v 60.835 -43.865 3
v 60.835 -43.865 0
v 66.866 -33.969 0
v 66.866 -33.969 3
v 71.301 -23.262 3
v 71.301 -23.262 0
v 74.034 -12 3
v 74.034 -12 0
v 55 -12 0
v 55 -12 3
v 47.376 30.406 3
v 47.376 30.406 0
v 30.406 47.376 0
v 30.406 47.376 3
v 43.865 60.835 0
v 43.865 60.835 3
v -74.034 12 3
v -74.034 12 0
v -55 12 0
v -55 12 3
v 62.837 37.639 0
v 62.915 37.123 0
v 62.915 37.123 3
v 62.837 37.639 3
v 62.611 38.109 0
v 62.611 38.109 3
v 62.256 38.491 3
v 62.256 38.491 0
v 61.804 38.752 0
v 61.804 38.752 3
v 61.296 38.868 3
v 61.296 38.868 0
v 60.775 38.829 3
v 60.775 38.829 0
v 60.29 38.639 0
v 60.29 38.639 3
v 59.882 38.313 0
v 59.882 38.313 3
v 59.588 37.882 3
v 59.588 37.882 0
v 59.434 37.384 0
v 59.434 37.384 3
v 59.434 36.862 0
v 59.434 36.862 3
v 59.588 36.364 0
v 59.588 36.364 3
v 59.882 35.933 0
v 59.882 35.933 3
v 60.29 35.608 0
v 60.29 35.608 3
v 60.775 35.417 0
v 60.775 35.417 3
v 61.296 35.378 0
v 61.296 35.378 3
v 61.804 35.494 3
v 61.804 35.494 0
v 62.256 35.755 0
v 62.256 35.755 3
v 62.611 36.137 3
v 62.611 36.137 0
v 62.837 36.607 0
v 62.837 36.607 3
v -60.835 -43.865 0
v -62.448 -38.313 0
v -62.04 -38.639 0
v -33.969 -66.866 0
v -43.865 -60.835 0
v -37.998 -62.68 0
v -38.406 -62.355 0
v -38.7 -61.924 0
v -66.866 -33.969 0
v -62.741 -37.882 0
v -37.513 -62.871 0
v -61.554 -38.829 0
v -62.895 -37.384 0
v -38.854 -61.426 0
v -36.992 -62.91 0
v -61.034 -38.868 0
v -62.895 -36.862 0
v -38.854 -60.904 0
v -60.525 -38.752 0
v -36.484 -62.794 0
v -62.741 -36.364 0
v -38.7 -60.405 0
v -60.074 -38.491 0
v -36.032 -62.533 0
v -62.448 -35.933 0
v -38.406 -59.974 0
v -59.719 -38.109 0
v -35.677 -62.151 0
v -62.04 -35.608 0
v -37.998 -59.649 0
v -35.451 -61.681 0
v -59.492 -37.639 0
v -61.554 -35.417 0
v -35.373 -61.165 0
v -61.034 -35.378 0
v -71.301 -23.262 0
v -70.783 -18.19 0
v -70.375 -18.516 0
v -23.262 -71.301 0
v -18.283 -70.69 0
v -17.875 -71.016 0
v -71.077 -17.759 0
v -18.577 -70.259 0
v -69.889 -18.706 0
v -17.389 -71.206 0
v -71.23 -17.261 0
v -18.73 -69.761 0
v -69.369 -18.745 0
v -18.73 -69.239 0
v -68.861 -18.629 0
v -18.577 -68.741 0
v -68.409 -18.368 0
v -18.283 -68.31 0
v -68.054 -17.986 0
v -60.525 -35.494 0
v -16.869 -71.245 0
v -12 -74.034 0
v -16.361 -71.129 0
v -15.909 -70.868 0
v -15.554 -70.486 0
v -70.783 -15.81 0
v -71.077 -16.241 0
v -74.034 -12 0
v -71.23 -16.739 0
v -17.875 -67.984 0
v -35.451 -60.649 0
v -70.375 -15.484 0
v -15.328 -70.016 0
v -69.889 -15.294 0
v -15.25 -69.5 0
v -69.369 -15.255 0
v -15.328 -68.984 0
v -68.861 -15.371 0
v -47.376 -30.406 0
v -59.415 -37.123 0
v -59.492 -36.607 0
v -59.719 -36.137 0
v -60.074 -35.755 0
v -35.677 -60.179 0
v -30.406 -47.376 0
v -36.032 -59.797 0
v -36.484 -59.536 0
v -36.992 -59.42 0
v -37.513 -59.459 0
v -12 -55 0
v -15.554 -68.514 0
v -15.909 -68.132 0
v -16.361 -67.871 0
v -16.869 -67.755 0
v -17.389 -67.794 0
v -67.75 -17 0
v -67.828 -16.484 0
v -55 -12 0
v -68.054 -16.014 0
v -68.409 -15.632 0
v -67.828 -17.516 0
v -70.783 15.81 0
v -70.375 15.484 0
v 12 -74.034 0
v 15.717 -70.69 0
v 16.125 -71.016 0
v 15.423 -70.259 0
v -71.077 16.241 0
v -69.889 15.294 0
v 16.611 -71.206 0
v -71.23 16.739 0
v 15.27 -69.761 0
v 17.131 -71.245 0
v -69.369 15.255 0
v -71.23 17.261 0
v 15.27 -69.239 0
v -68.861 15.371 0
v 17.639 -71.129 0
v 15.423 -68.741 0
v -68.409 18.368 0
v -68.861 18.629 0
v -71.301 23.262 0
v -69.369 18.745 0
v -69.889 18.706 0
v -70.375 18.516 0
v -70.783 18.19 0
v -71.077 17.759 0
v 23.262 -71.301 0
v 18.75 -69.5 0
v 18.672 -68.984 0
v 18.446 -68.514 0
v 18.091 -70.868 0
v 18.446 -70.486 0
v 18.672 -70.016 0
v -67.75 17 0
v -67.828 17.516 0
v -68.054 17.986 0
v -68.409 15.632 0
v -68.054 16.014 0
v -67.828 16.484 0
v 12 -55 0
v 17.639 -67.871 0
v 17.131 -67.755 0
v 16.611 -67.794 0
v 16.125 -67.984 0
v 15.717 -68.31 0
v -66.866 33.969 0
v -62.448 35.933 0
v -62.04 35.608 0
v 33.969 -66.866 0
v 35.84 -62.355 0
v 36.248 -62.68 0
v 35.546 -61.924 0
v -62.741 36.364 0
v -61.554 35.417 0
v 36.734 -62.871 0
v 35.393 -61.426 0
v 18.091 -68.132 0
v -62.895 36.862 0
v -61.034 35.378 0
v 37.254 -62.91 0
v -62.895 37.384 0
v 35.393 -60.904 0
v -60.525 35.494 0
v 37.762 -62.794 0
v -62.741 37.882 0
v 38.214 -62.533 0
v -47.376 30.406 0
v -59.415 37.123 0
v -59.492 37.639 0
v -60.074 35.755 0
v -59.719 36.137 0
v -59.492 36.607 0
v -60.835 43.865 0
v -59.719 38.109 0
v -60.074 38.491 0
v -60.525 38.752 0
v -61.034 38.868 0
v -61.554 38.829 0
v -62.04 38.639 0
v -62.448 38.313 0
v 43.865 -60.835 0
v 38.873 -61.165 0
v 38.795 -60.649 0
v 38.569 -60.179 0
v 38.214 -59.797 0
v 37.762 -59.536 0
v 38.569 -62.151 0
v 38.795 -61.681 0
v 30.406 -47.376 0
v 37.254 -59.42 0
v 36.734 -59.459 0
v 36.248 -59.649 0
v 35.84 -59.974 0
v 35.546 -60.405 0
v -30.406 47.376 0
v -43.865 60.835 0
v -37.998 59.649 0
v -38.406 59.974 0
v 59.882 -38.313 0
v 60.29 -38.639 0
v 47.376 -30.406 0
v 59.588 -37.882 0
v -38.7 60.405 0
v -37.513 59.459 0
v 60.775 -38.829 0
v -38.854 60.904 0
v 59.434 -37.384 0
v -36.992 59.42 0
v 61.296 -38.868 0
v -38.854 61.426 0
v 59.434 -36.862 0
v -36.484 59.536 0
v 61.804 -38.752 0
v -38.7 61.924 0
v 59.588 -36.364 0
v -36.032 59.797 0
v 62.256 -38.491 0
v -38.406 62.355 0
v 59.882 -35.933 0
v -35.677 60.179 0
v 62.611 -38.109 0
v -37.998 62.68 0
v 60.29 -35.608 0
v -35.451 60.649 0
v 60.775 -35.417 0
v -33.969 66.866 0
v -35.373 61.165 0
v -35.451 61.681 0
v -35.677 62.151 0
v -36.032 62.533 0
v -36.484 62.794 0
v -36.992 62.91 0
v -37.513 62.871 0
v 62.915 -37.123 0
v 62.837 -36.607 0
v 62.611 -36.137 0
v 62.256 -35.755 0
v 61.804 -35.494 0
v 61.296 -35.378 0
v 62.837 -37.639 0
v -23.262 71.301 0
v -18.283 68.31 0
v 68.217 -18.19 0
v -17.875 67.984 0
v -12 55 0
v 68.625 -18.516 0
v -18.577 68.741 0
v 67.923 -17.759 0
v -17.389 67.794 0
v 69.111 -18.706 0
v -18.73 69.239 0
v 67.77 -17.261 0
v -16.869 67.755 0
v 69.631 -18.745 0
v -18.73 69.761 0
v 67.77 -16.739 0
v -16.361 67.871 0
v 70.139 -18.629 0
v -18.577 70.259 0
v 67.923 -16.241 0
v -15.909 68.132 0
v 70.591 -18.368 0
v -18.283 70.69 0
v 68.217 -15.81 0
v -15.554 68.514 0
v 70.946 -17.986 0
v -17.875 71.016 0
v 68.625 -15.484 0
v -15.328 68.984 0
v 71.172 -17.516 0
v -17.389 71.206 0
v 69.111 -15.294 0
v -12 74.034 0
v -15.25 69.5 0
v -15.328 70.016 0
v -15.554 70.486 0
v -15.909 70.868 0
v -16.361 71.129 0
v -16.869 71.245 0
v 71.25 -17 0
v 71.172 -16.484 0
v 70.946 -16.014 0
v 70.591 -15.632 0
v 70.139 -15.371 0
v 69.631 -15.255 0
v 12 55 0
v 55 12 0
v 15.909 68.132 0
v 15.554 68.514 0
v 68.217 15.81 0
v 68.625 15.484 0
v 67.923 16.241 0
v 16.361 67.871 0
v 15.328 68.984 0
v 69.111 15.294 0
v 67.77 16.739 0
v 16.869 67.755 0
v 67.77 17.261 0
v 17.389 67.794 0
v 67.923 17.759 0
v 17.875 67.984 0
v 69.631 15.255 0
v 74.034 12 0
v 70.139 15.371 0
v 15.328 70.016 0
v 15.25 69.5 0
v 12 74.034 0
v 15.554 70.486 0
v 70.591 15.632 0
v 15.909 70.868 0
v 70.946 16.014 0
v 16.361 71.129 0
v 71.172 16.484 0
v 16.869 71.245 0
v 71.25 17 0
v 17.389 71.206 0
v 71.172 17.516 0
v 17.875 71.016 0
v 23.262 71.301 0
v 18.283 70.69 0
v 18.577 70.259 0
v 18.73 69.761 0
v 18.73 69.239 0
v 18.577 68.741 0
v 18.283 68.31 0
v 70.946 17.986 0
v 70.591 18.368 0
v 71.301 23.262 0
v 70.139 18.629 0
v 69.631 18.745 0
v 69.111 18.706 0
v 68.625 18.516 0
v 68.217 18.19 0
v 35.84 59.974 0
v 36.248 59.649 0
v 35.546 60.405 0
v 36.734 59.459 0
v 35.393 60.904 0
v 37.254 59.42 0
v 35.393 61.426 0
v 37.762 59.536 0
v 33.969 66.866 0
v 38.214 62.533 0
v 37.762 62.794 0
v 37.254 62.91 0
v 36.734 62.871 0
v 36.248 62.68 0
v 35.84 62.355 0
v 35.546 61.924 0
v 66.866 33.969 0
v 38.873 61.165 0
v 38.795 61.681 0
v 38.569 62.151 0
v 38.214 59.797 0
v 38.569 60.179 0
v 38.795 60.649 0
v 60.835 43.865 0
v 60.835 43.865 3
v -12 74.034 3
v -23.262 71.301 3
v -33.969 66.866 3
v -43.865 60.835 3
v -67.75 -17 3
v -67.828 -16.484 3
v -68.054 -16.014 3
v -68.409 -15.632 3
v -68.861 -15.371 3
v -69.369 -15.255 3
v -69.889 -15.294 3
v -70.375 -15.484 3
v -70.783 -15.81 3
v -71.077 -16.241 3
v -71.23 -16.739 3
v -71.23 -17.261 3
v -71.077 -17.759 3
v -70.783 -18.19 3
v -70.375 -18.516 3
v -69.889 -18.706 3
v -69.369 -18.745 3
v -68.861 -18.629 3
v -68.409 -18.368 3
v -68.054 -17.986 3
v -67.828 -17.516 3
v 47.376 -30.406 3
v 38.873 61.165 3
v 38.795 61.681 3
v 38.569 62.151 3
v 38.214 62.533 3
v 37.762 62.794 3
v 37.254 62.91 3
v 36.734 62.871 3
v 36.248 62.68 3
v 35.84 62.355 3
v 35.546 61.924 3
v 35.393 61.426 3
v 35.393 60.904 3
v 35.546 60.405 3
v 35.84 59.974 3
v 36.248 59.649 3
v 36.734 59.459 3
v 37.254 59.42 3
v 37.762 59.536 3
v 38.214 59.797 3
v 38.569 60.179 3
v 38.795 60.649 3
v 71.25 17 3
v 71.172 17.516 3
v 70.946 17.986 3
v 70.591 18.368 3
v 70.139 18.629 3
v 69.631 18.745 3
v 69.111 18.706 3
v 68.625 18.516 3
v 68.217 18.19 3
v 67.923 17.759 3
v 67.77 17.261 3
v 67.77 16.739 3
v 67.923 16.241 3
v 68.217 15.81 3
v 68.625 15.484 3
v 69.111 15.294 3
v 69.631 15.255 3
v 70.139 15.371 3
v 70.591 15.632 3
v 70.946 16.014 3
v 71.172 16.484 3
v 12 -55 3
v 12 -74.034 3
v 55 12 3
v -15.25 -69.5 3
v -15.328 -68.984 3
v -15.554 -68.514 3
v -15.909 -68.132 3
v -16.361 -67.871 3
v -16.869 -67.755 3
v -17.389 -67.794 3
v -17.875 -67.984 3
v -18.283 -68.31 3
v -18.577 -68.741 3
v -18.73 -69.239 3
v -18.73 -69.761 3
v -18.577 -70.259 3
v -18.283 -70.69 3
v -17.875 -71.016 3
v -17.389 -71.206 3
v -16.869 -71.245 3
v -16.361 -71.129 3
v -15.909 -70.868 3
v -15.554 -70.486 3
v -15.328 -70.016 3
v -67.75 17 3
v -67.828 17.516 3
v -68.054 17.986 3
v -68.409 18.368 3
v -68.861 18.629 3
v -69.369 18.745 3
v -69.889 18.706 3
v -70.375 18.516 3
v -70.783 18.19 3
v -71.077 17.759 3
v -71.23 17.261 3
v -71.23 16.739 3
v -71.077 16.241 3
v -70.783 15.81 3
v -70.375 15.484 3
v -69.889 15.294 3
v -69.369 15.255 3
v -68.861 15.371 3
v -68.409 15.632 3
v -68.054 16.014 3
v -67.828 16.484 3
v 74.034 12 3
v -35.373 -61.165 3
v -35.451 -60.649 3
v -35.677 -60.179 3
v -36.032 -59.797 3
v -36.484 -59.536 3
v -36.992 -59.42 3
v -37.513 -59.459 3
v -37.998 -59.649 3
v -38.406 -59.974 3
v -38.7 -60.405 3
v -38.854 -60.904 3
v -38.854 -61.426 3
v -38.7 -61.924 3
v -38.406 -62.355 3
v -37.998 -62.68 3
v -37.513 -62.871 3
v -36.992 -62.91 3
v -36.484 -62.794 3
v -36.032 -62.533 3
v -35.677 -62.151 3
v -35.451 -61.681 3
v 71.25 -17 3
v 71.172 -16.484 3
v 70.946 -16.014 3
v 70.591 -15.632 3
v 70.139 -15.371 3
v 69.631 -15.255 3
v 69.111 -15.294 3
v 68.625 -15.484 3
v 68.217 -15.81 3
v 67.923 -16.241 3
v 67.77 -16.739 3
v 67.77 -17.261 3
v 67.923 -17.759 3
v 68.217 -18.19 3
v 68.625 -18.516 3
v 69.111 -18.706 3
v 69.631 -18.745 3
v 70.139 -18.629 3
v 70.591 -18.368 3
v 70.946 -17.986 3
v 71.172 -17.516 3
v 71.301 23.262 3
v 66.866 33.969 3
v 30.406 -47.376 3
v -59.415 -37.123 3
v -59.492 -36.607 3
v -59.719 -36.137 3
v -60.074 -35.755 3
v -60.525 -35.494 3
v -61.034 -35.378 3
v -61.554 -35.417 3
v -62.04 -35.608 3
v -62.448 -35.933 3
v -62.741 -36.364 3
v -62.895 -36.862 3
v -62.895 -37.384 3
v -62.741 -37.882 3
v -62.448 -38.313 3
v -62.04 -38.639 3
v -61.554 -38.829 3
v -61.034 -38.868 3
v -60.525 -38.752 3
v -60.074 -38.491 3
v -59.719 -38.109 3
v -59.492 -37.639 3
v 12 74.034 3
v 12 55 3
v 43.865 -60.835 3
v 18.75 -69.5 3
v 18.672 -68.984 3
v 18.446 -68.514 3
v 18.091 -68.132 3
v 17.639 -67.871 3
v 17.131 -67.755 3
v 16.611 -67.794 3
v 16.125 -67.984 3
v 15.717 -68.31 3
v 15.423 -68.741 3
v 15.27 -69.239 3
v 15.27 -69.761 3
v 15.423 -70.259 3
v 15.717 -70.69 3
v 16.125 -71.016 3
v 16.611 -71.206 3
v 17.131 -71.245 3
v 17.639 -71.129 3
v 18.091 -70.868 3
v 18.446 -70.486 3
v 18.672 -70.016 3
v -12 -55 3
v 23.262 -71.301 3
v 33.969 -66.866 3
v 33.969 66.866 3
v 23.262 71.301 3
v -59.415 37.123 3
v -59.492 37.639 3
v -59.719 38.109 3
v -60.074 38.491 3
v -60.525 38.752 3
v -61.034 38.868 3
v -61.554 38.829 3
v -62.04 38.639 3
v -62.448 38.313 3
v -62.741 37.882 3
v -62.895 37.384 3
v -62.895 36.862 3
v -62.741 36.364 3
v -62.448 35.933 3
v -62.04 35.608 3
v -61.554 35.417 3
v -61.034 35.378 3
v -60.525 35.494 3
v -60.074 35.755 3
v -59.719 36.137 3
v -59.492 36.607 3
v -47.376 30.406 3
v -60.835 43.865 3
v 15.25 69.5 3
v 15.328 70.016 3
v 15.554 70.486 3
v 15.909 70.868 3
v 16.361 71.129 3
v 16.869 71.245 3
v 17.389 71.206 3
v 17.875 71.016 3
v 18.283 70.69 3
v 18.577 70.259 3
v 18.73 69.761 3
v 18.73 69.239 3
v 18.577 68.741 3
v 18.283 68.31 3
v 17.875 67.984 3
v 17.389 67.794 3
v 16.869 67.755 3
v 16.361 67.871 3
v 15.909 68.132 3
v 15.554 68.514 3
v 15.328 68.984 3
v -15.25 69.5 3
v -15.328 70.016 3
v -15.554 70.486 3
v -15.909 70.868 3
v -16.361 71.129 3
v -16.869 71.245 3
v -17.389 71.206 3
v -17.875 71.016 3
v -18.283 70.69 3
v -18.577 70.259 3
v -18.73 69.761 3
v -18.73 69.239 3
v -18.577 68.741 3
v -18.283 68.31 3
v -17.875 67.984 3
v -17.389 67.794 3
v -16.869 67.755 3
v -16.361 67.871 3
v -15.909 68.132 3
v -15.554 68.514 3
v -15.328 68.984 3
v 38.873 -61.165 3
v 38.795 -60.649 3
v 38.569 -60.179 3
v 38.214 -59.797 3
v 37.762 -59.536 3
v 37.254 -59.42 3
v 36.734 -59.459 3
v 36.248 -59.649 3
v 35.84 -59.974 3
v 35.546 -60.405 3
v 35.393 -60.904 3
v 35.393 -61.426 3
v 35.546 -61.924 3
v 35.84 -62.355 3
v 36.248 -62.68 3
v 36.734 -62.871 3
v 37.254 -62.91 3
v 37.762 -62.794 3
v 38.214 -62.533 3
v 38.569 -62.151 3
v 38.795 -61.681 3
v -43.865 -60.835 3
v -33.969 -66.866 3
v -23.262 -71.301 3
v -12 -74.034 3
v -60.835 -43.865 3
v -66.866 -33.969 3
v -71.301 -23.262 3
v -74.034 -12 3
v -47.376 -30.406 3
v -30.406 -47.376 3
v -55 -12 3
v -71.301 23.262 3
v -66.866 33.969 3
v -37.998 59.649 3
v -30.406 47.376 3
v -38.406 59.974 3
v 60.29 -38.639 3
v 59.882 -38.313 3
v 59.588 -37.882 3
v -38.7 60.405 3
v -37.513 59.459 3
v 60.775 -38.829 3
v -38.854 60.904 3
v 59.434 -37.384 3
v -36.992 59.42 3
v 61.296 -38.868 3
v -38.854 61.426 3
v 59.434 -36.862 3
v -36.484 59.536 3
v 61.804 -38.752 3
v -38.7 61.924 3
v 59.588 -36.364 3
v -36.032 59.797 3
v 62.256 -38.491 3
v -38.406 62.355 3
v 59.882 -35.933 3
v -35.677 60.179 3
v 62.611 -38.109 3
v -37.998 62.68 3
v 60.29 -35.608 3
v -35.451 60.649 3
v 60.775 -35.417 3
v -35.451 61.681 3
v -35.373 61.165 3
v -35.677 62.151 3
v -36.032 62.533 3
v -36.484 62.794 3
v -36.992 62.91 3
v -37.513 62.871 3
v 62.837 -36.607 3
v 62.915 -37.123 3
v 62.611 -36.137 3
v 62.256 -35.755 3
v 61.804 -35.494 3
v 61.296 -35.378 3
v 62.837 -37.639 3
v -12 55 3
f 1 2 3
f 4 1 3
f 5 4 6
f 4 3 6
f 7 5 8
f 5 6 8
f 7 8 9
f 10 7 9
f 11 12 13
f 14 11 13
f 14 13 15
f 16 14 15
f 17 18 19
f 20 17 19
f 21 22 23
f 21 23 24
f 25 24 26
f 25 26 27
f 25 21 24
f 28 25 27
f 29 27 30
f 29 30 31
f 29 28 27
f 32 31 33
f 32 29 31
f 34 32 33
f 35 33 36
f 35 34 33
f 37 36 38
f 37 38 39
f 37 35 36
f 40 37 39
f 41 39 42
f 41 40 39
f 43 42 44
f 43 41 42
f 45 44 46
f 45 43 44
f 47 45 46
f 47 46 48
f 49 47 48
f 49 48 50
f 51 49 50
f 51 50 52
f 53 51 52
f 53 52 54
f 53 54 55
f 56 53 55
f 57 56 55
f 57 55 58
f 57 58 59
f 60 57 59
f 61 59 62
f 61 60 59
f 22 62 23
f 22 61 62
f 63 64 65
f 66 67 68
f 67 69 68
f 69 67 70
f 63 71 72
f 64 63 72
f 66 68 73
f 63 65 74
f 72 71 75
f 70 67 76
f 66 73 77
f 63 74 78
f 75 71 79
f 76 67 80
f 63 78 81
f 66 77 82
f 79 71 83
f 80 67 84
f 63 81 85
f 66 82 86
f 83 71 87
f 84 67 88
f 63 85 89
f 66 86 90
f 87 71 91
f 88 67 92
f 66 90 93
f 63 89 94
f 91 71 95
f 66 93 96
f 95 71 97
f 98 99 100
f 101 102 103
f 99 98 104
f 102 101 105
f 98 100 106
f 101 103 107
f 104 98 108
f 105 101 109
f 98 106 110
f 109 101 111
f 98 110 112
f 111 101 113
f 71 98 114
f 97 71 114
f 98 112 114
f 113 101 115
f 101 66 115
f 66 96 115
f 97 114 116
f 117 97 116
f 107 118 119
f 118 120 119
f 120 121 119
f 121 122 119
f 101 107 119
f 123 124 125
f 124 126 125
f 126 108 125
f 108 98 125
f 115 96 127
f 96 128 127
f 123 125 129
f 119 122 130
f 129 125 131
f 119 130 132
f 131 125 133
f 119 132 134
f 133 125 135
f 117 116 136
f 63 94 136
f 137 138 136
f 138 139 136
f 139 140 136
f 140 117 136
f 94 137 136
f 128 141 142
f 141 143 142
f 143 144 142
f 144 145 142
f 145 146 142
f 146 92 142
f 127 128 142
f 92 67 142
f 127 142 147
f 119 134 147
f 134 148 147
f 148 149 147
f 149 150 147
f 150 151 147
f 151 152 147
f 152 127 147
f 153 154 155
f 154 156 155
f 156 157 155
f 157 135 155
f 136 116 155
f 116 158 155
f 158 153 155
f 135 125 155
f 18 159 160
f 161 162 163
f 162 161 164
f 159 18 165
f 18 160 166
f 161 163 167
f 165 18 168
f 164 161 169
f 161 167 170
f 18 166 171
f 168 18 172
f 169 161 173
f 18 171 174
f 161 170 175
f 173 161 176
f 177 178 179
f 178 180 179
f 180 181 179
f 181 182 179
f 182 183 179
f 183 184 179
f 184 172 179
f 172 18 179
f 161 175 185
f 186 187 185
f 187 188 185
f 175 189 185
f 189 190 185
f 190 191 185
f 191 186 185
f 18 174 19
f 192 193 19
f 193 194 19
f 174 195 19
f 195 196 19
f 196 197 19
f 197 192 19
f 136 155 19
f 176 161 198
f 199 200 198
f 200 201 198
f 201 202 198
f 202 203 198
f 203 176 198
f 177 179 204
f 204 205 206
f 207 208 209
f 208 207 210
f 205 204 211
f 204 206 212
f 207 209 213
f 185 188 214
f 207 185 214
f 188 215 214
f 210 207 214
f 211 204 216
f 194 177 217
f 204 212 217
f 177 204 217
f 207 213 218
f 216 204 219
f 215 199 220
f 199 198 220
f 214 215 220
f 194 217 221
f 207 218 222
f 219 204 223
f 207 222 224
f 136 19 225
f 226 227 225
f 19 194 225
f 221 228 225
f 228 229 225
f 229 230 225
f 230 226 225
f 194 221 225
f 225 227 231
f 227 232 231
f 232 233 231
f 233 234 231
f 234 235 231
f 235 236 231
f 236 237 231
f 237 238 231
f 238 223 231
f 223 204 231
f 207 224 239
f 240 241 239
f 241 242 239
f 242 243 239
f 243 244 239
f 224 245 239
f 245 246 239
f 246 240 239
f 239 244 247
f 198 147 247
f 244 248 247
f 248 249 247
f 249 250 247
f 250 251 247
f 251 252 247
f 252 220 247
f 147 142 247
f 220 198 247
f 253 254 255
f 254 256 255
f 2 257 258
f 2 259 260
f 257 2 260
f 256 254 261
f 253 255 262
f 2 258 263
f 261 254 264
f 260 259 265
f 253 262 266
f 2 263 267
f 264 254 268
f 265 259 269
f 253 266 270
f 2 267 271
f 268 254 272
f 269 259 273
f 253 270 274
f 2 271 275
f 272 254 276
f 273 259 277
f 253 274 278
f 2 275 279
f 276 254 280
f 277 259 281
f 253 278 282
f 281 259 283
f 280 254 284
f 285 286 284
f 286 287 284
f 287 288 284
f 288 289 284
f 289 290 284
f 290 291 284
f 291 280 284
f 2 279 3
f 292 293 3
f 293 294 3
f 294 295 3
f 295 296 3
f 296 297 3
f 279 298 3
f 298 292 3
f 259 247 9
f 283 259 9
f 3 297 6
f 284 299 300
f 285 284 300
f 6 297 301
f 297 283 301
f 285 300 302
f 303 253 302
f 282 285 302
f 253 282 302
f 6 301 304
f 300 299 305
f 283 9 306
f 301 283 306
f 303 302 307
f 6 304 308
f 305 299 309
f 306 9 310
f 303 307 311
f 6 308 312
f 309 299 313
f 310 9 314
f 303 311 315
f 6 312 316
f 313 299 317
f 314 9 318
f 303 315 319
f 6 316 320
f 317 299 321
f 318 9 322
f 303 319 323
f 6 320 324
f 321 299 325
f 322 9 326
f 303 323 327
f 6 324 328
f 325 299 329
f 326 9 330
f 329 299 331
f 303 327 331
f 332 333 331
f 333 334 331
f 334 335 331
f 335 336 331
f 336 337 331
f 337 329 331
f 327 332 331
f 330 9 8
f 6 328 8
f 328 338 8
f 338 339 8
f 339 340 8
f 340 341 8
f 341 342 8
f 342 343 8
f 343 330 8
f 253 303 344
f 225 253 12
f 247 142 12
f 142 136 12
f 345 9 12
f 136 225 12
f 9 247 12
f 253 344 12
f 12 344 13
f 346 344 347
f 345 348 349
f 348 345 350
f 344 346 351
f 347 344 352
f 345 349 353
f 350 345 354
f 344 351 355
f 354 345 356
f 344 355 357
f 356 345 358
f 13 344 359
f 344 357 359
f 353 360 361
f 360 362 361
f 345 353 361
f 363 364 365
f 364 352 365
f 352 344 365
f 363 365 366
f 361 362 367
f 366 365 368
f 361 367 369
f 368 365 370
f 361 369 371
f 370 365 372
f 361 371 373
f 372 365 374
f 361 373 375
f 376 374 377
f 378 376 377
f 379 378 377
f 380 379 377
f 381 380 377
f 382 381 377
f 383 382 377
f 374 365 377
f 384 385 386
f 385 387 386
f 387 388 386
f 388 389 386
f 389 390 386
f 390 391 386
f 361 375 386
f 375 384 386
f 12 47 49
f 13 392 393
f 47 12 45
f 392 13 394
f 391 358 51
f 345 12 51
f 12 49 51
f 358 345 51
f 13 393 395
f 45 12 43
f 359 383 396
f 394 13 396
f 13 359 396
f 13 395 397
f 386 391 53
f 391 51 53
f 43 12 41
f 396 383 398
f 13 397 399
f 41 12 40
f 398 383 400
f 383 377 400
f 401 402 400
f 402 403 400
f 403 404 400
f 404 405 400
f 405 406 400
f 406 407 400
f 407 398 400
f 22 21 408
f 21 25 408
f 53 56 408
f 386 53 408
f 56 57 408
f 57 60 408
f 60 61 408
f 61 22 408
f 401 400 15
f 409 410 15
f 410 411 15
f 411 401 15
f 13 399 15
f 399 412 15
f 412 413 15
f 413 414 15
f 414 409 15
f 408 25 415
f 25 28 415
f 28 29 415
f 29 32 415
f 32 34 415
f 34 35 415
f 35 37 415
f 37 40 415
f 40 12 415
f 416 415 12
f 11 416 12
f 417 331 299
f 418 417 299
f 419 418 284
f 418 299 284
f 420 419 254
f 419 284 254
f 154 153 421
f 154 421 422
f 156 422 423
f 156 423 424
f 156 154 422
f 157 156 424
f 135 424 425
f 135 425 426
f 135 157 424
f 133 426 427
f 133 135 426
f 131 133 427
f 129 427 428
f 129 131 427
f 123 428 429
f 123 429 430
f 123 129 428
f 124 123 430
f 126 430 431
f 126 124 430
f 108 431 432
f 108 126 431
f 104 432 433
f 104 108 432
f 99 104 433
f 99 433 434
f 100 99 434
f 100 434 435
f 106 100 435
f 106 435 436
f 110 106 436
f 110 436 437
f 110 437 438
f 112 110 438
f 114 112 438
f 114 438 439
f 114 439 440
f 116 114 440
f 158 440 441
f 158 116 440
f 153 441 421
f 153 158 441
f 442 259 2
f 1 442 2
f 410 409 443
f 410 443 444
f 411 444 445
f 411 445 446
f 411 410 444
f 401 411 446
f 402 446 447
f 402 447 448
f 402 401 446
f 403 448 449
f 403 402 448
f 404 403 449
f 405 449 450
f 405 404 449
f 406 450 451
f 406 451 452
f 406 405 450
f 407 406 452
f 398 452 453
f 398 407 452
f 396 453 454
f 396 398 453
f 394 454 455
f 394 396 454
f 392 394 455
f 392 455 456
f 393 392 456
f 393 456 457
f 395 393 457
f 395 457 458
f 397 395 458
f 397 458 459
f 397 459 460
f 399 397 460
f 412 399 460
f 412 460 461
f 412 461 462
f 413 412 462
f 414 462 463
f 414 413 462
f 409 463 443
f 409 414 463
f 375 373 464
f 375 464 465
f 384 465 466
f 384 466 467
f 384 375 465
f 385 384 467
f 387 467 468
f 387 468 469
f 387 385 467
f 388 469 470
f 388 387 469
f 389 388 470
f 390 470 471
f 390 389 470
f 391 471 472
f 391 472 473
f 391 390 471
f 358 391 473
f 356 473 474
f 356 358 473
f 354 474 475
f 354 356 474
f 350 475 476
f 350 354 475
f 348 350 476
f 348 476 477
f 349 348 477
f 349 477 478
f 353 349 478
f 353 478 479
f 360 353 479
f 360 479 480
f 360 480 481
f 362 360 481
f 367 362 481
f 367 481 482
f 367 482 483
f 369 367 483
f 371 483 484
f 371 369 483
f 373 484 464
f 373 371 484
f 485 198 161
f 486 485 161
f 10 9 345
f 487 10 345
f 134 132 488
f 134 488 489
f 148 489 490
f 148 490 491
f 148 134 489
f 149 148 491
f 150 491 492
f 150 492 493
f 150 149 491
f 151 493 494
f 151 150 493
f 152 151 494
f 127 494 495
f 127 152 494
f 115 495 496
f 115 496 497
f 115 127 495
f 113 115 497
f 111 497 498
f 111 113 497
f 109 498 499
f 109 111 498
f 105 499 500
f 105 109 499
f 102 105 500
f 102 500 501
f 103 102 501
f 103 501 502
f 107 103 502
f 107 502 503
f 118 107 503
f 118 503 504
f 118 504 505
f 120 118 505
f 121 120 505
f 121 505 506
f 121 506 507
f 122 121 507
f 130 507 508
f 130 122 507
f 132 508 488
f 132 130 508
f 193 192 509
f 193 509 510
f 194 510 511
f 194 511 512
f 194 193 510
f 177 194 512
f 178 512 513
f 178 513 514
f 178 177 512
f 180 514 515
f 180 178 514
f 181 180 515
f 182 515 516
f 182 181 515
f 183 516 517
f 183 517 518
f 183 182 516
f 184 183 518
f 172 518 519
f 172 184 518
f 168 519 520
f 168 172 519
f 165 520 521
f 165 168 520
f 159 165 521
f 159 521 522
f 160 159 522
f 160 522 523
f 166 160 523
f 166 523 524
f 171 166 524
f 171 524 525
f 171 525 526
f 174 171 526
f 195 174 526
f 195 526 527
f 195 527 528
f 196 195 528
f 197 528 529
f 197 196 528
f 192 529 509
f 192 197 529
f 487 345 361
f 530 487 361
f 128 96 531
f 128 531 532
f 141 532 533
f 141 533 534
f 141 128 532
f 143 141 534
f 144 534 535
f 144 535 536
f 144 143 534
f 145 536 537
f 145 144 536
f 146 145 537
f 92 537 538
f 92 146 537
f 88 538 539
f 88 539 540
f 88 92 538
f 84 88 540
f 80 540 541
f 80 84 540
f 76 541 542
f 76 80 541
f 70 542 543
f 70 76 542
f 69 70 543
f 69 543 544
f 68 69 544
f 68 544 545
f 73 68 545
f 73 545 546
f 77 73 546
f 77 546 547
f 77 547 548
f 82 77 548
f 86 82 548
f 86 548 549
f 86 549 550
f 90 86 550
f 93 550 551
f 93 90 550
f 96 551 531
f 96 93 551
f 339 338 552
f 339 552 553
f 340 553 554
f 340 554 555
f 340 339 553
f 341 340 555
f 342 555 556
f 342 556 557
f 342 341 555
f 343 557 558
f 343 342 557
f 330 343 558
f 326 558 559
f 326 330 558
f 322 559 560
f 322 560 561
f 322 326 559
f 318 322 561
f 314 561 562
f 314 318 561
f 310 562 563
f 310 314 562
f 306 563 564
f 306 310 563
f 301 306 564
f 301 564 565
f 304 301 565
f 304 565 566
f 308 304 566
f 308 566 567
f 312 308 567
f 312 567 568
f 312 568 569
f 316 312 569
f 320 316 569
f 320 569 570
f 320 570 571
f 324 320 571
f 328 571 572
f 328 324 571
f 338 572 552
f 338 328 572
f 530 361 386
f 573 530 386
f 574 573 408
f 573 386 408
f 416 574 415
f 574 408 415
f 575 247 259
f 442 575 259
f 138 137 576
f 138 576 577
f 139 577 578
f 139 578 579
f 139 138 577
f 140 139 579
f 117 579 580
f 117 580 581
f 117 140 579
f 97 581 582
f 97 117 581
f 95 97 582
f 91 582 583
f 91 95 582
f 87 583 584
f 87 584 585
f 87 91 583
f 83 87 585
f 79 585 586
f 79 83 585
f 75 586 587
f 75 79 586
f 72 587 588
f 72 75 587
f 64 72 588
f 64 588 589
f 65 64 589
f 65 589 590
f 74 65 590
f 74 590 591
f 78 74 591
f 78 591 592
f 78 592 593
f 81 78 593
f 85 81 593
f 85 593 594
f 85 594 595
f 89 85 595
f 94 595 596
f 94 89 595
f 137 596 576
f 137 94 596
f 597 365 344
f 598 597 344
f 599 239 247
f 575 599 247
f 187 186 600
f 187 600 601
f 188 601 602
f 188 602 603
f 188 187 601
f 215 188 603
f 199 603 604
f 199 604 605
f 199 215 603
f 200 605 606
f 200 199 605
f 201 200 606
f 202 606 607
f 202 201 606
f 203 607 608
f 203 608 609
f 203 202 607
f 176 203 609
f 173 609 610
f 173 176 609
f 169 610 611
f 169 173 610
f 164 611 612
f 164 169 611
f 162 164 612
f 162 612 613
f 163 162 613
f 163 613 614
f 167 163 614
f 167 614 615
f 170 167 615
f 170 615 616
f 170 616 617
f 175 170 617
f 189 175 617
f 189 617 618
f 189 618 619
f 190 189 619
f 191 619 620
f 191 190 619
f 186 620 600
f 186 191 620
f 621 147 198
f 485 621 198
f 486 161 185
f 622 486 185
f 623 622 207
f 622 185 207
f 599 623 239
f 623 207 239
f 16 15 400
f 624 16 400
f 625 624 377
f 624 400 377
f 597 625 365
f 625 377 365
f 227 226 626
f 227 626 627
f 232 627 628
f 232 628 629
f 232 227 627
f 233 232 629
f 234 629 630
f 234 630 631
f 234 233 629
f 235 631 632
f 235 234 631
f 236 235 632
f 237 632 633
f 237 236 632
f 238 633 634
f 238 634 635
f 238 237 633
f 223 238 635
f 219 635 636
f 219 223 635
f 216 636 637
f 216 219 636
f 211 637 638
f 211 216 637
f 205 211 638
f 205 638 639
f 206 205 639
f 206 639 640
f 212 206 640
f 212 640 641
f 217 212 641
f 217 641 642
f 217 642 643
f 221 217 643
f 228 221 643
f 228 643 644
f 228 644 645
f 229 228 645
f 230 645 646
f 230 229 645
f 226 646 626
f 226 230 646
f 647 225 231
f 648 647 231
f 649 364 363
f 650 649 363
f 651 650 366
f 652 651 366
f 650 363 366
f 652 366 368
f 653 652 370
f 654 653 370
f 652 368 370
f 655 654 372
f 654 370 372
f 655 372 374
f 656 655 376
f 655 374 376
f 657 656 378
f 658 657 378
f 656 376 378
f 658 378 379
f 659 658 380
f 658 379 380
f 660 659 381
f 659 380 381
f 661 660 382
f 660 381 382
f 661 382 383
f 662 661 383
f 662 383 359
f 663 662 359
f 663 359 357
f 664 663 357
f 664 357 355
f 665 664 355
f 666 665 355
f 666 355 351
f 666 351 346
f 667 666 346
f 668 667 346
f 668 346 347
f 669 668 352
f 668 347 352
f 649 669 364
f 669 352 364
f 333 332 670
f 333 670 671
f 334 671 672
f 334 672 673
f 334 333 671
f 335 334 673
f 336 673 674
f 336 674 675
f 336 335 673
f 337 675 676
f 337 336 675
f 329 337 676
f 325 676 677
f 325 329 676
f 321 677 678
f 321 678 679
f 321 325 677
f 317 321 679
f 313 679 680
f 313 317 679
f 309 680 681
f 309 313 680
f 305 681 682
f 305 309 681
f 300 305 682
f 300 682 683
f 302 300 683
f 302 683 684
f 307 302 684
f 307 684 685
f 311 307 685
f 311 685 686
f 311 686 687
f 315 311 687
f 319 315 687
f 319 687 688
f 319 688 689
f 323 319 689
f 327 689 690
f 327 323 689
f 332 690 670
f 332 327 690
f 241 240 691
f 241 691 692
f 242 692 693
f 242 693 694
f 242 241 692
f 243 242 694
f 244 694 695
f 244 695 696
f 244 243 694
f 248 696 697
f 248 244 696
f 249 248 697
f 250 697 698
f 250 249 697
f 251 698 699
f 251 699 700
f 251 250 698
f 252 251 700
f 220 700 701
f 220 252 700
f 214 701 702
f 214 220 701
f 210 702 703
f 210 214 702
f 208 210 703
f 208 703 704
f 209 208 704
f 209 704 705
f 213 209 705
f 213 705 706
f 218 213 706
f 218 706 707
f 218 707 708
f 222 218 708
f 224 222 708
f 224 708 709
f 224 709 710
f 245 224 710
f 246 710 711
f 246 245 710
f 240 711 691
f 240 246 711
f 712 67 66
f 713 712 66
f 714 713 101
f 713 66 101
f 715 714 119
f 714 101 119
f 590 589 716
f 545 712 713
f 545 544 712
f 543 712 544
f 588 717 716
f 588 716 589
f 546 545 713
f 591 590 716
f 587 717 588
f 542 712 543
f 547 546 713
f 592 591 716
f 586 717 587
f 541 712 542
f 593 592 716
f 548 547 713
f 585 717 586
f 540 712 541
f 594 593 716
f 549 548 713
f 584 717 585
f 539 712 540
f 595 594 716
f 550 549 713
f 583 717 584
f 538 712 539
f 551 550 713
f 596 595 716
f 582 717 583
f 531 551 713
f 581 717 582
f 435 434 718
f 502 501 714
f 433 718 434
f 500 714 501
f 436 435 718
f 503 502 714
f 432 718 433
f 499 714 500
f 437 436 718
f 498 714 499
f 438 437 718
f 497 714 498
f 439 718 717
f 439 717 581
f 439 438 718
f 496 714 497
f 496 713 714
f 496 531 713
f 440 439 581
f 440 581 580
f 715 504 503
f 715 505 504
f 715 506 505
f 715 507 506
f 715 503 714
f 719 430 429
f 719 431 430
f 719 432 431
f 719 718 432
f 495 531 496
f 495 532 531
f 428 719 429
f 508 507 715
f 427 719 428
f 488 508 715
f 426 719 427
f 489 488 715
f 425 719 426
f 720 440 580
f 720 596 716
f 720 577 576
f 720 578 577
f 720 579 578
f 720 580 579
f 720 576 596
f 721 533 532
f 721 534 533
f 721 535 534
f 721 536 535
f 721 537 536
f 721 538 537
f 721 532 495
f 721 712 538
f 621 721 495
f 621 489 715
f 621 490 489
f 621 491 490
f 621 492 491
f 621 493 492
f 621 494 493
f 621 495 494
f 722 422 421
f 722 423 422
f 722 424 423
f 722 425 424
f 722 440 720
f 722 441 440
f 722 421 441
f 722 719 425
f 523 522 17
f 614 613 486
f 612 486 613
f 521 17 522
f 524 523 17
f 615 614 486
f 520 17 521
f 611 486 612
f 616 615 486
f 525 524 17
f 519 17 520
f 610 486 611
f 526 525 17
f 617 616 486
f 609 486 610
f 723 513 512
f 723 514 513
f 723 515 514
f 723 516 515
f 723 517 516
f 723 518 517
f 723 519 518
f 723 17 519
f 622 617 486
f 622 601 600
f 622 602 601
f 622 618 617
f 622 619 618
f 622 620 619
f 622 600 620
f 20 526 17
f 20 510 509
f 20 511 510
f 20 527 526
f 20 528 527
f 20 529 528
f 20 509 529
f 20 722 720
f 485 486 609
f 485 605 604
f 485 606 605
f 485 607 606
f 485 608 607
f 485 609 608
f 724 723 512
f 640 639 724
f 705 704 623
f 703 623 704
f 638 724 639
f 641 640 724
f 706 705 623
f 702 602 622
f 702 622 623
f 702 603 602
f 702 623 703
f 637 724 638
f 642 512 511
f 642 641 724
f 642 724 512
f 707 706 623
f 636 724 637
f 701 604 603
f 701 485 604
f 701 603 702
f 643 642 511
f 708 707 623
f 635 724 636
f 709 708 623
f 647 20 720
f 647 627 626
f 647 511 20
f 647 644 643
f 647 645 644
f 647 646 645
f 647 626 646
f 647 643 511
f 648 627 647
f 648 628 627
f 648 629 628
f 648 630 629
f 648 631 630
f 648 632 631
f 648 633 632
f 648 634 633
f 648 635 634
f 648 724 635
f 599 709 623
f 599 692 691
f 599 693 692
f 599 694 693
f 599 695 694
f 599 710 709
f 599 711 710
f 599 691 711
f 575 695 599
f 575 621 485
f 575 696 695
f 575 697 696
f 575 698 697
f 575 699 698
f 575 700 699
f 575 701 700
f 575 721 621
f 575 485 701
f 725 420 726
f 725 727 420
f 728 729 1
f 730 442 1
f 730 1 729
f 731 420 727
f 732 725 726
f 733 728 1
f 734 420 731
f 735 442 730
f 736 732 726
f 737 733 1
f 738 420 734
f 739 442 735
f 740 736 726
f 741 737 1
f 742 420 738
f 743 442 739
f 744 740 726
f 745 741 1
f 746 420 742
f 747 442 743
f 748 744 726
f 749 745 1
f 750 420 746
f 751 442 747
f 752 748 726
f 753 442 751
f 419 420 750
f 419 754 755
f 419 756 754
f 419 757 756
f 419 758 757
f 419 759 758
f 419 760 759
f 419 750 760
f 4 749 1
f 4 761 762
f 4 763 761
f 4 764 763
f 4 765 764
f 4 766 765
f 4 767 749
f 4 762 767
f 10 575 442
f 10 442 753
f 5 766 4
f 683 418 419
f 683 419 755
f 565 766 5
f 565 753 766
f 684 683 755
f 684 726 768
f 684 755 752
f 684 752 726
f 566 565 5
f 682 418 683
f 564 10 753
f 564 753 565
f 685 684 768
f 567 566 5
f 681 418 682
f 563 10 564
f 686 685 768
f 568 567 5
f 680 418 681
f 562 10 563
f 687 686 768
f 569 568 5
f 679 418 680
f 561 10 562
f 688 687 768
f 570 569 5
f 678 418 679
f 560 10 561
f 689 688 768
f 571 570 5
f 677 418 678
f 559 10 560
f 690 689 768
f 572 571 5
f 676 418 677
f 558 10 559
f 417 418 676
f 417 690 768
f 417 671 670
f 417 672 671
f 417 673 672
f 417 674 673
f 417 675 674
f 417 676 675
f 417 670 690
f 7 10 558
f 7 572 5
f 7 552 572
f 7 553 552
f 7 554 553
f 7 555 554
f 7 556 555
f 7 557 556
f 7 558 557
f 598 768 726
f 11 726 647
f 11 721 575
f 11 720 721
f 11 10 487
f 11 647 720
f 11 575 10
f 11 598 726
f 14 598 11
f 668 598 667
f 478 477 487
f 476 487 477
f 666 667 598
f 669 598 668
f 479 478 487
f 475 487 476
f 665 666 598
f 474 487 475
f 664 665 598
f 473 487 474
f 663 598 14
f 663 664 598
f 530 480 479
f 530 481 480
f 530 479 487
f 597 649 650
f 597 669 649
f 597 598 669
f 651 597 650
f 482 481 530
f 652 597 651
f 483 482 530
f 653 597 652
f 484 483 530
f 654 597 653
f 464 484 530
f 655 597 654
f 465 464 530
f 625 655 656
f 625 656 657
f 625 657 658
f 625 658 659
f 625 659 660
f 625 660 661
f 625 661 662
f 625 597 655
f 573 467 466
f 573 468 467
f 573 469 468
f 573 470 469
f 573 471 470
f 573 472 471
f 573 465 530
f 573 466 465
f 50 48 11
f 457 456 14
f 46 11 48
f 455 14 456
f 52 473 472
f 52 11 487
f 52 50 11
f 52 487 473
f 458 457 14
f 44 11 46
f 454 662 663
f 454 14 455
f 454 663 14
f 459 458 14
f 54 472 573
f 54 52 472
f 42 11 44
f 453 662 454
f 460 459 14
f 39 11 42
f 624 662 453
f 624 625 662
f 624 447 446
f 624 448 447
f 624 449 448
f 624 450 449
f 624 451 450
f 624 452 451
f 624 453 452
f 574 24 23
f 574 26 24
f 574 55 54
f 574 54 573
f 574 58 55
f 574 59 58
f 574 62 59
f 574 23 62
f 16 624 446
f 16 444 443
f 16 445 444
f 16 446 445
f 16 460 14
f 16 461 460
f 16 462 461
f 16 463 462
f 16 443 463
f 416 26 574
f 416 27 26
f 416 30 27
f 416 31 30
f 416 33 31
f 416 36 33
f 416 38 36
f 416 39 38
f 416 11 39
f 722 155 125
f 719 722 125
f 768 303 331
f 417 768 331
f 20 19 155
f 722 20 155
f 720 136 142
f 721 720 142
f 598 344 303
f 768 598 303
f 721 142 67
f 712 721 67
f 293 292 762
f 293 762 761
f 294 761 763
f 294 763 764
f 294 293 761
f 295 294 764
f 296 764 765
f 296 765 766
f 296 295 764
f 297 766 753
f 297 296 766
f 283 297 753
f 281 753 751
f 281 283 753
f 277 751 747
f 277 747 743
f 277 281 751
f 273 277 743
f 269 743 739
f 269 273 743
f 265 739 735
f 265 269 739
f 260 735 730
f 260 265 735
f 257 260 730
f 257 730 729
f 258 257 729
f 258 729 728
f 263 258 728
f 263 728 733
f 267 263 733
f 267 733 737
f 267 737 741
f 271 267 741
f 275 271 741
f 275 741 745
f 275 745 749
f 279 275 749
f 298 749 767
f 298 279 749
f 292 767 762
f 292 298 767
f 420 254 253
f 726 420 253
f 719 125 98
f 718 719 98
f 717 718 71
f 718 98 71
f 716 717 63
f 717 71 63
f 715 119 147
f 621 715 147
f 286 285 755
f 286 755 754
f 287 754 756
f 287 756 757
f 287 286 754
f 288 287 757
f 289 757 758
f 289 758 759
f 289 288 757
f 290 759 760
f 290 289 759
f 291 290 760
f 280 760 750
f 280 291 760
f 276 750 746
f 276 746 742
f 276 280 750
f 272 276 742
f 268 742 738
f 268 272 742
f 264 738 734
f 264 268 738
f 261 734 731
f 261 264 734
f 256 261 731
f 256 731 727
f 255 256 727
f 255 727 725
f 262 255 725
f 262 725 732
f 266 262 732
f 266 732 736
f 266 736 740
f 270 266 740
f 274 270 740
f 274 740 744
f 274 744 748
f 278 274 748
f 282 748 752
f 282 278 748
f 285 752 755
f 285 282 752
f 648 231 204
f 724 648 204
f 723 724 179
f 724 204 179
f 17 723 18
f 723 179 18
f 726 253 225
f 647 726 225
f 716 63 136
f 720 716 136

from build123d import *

# Parameters (mm, degrees)
SKETCH1_R           = 1.75
BOSS_EXTRUDE2_DEPTH = 3


with BuildPart() as part:
    # Sketch1 → Boss-Extrude2 (new body)
    with BuildSketch(Plane.XY):
        with BuildLine():
            Line((12, 55), (0, 55))
            Line((0, 55), (-12, 55))
            Line((-12, 55), (-12, 69.5))
            Line((-12, 69.5), (-12, 74.033776076))
            ThreePointArc((-12, 74.033776076), (-28.701257427, 69.290964938), (-43.864503726, 60.835066474))
            Line((-43.864503726, 60.835066474), (-30.405591591, 47.376154339))
            Line((-30.405591591, 47.376154339), (-47.376154339, 30.405591591))
            Line((-47.376154339, 30.405591591), (-60.835066474, 43.864503726))
            ThreePointArc((-60.835066474, 43.864503726), (-69.290964938, 28.701257427), (-74.033776076, 12))
            Line((-74.033776076, 12), (-55, 12))
            Line((-55, 12), (-55, -12))
            Line((-55, -12), (-74.033776076, -12))
            ThreePointArc((-74.033776076, -12), (-69.290964938, -28.701257427), (-60.835066474, -43.864503726))
            Line((-60.835066474, -43.864503726), (-47.376154339, -30.405591591))
            Line((-47.376154339, -30.405591591), (-30.405591591, -47.376154339))
            Line((-30.405591591, -47.376154339), (-43.864503726, -60.835066474))
            ThreePointArc((-43.864503726, -60.835066474), (-28.701257427, -69.290964938), (-12, -74.033776076))
            Line((-12, -74.033776076), (-12, -55))
            Line((-12, -55), (12, -55))
            Line((12, -55), (12, -74.033776076))
            ThreePointArc((12, -74.033776076), (28.701257427, -69.290964938), (43.864503726, -60.835066474))
            Line((43.864503726, -60.835066474), (30.405591591, -47.376154339))
            Line((30.405591591, -47.376154339), (47.37615434, -30.405591591))
            Line((47.37615434, -30.405591591), (60.835066474, -43.864503726))
            ThreePointArc((60.835066474, -43.864503726), (69.290964938, -28.701257427), (74.033776076, -12))
            Line((74.033776076, -12), (55, -12))
            Line((55, -12), (55, 12))
            Line((55, 12), (74.033776076, 12))
            ThreePointArc((74.033776076, 12), (69.290964938, 28.701257427), (60.835066474, 43.864503726))
            Line((60.835066474, 43.864503726), (47.376154339, 30.405591591))
            Line((47.376154339, 30.405591591), (30.405591591, 47.37615434))
            Line((30.405591591, 47.37615434), (43.864503726, 60.835066474))
            ThreePointArc((43.864503726, 60.835066474), (28.701257427, 69.290964938), (12, 74.033776076))
            Line((12, 74.033776076), (12, 69.5))
            Line((12, 69.5), (12, 55))
        make_face()
        with Locations((-37.123106012, -61.164736573)):
            Circle(SKETCH1_R, mode=Mode.SUBTRACT)
        with Locations((-17, -69.5)):
            Circle(SKETCH1_R, mode=Mode.SUBTRACT)
        with Locations((-61.164736573, -37.123106012)):
            Circle(SKETCH1_R, mode=Mode.SUBTRACT)
        with Locations((-69.5, -17)):
            Circle(SKETCH1_R, mode=Mode.SUBTRACT)
        with Locations((17, -69.5)):
            Circle(SKETCH1_R, mode=Mode.SUBTRACT)
        with Locations((37.123106012, -61.164736573)):
            Circle(SKETCH1_R, mode=Mode.SUBTRACT)
        with Locations((61.164736573, -37.123106012)):
            Circle(SKETCH1_R, mode=Mode.SUBTRACT)
        with Locations((69.5, -17)):
            Circle(SKETCH1_R, mode=Mode.SUBTRACT)
        with Locations((-69.5, 17)):
            Circle(SKETCH1_R, mode=Mode.SUBTRACT)
        with Locations((-61.164736573, 37.123106012)):
            Circle(SKETCH1_R, mode=Mode.SUBTRACT)
        with Locations((-37.123106012, 61.164736573)):
            Circle(SKETCH1_R, mode=Mode.SUBTRACT)
        with Locations((-17, 69.5)):
            Circle(SKETCH1_R, mode=Mode.SUBTRACT)
        with Locations((69.5, 17)):
            Circle(SKETCH1_R, mode=Mode.SUBTRACT)
        with Locations((61.164736573, 37.123106012)):
            Circle(SKETCH1_R, mode=Mode.SUBTRACT)
        with BuildLine():
            ThreePointArc((18.75, 69.5), (17, 67.75), (15.25, 69.5))
            ThreePointArc((15.25, 69.5), (17, 71.25), (18.75, 69.5))
        make_face(mode=Mode.SUBTRACT)
        with Locations((37.123106012, 61.164736573)):
            Circle(SKETCH1_R, mode=Mode.SUBTRACT)
    extrude(amount=BOSS_EXTRUDE2_DEPTH)


solid = part.part
